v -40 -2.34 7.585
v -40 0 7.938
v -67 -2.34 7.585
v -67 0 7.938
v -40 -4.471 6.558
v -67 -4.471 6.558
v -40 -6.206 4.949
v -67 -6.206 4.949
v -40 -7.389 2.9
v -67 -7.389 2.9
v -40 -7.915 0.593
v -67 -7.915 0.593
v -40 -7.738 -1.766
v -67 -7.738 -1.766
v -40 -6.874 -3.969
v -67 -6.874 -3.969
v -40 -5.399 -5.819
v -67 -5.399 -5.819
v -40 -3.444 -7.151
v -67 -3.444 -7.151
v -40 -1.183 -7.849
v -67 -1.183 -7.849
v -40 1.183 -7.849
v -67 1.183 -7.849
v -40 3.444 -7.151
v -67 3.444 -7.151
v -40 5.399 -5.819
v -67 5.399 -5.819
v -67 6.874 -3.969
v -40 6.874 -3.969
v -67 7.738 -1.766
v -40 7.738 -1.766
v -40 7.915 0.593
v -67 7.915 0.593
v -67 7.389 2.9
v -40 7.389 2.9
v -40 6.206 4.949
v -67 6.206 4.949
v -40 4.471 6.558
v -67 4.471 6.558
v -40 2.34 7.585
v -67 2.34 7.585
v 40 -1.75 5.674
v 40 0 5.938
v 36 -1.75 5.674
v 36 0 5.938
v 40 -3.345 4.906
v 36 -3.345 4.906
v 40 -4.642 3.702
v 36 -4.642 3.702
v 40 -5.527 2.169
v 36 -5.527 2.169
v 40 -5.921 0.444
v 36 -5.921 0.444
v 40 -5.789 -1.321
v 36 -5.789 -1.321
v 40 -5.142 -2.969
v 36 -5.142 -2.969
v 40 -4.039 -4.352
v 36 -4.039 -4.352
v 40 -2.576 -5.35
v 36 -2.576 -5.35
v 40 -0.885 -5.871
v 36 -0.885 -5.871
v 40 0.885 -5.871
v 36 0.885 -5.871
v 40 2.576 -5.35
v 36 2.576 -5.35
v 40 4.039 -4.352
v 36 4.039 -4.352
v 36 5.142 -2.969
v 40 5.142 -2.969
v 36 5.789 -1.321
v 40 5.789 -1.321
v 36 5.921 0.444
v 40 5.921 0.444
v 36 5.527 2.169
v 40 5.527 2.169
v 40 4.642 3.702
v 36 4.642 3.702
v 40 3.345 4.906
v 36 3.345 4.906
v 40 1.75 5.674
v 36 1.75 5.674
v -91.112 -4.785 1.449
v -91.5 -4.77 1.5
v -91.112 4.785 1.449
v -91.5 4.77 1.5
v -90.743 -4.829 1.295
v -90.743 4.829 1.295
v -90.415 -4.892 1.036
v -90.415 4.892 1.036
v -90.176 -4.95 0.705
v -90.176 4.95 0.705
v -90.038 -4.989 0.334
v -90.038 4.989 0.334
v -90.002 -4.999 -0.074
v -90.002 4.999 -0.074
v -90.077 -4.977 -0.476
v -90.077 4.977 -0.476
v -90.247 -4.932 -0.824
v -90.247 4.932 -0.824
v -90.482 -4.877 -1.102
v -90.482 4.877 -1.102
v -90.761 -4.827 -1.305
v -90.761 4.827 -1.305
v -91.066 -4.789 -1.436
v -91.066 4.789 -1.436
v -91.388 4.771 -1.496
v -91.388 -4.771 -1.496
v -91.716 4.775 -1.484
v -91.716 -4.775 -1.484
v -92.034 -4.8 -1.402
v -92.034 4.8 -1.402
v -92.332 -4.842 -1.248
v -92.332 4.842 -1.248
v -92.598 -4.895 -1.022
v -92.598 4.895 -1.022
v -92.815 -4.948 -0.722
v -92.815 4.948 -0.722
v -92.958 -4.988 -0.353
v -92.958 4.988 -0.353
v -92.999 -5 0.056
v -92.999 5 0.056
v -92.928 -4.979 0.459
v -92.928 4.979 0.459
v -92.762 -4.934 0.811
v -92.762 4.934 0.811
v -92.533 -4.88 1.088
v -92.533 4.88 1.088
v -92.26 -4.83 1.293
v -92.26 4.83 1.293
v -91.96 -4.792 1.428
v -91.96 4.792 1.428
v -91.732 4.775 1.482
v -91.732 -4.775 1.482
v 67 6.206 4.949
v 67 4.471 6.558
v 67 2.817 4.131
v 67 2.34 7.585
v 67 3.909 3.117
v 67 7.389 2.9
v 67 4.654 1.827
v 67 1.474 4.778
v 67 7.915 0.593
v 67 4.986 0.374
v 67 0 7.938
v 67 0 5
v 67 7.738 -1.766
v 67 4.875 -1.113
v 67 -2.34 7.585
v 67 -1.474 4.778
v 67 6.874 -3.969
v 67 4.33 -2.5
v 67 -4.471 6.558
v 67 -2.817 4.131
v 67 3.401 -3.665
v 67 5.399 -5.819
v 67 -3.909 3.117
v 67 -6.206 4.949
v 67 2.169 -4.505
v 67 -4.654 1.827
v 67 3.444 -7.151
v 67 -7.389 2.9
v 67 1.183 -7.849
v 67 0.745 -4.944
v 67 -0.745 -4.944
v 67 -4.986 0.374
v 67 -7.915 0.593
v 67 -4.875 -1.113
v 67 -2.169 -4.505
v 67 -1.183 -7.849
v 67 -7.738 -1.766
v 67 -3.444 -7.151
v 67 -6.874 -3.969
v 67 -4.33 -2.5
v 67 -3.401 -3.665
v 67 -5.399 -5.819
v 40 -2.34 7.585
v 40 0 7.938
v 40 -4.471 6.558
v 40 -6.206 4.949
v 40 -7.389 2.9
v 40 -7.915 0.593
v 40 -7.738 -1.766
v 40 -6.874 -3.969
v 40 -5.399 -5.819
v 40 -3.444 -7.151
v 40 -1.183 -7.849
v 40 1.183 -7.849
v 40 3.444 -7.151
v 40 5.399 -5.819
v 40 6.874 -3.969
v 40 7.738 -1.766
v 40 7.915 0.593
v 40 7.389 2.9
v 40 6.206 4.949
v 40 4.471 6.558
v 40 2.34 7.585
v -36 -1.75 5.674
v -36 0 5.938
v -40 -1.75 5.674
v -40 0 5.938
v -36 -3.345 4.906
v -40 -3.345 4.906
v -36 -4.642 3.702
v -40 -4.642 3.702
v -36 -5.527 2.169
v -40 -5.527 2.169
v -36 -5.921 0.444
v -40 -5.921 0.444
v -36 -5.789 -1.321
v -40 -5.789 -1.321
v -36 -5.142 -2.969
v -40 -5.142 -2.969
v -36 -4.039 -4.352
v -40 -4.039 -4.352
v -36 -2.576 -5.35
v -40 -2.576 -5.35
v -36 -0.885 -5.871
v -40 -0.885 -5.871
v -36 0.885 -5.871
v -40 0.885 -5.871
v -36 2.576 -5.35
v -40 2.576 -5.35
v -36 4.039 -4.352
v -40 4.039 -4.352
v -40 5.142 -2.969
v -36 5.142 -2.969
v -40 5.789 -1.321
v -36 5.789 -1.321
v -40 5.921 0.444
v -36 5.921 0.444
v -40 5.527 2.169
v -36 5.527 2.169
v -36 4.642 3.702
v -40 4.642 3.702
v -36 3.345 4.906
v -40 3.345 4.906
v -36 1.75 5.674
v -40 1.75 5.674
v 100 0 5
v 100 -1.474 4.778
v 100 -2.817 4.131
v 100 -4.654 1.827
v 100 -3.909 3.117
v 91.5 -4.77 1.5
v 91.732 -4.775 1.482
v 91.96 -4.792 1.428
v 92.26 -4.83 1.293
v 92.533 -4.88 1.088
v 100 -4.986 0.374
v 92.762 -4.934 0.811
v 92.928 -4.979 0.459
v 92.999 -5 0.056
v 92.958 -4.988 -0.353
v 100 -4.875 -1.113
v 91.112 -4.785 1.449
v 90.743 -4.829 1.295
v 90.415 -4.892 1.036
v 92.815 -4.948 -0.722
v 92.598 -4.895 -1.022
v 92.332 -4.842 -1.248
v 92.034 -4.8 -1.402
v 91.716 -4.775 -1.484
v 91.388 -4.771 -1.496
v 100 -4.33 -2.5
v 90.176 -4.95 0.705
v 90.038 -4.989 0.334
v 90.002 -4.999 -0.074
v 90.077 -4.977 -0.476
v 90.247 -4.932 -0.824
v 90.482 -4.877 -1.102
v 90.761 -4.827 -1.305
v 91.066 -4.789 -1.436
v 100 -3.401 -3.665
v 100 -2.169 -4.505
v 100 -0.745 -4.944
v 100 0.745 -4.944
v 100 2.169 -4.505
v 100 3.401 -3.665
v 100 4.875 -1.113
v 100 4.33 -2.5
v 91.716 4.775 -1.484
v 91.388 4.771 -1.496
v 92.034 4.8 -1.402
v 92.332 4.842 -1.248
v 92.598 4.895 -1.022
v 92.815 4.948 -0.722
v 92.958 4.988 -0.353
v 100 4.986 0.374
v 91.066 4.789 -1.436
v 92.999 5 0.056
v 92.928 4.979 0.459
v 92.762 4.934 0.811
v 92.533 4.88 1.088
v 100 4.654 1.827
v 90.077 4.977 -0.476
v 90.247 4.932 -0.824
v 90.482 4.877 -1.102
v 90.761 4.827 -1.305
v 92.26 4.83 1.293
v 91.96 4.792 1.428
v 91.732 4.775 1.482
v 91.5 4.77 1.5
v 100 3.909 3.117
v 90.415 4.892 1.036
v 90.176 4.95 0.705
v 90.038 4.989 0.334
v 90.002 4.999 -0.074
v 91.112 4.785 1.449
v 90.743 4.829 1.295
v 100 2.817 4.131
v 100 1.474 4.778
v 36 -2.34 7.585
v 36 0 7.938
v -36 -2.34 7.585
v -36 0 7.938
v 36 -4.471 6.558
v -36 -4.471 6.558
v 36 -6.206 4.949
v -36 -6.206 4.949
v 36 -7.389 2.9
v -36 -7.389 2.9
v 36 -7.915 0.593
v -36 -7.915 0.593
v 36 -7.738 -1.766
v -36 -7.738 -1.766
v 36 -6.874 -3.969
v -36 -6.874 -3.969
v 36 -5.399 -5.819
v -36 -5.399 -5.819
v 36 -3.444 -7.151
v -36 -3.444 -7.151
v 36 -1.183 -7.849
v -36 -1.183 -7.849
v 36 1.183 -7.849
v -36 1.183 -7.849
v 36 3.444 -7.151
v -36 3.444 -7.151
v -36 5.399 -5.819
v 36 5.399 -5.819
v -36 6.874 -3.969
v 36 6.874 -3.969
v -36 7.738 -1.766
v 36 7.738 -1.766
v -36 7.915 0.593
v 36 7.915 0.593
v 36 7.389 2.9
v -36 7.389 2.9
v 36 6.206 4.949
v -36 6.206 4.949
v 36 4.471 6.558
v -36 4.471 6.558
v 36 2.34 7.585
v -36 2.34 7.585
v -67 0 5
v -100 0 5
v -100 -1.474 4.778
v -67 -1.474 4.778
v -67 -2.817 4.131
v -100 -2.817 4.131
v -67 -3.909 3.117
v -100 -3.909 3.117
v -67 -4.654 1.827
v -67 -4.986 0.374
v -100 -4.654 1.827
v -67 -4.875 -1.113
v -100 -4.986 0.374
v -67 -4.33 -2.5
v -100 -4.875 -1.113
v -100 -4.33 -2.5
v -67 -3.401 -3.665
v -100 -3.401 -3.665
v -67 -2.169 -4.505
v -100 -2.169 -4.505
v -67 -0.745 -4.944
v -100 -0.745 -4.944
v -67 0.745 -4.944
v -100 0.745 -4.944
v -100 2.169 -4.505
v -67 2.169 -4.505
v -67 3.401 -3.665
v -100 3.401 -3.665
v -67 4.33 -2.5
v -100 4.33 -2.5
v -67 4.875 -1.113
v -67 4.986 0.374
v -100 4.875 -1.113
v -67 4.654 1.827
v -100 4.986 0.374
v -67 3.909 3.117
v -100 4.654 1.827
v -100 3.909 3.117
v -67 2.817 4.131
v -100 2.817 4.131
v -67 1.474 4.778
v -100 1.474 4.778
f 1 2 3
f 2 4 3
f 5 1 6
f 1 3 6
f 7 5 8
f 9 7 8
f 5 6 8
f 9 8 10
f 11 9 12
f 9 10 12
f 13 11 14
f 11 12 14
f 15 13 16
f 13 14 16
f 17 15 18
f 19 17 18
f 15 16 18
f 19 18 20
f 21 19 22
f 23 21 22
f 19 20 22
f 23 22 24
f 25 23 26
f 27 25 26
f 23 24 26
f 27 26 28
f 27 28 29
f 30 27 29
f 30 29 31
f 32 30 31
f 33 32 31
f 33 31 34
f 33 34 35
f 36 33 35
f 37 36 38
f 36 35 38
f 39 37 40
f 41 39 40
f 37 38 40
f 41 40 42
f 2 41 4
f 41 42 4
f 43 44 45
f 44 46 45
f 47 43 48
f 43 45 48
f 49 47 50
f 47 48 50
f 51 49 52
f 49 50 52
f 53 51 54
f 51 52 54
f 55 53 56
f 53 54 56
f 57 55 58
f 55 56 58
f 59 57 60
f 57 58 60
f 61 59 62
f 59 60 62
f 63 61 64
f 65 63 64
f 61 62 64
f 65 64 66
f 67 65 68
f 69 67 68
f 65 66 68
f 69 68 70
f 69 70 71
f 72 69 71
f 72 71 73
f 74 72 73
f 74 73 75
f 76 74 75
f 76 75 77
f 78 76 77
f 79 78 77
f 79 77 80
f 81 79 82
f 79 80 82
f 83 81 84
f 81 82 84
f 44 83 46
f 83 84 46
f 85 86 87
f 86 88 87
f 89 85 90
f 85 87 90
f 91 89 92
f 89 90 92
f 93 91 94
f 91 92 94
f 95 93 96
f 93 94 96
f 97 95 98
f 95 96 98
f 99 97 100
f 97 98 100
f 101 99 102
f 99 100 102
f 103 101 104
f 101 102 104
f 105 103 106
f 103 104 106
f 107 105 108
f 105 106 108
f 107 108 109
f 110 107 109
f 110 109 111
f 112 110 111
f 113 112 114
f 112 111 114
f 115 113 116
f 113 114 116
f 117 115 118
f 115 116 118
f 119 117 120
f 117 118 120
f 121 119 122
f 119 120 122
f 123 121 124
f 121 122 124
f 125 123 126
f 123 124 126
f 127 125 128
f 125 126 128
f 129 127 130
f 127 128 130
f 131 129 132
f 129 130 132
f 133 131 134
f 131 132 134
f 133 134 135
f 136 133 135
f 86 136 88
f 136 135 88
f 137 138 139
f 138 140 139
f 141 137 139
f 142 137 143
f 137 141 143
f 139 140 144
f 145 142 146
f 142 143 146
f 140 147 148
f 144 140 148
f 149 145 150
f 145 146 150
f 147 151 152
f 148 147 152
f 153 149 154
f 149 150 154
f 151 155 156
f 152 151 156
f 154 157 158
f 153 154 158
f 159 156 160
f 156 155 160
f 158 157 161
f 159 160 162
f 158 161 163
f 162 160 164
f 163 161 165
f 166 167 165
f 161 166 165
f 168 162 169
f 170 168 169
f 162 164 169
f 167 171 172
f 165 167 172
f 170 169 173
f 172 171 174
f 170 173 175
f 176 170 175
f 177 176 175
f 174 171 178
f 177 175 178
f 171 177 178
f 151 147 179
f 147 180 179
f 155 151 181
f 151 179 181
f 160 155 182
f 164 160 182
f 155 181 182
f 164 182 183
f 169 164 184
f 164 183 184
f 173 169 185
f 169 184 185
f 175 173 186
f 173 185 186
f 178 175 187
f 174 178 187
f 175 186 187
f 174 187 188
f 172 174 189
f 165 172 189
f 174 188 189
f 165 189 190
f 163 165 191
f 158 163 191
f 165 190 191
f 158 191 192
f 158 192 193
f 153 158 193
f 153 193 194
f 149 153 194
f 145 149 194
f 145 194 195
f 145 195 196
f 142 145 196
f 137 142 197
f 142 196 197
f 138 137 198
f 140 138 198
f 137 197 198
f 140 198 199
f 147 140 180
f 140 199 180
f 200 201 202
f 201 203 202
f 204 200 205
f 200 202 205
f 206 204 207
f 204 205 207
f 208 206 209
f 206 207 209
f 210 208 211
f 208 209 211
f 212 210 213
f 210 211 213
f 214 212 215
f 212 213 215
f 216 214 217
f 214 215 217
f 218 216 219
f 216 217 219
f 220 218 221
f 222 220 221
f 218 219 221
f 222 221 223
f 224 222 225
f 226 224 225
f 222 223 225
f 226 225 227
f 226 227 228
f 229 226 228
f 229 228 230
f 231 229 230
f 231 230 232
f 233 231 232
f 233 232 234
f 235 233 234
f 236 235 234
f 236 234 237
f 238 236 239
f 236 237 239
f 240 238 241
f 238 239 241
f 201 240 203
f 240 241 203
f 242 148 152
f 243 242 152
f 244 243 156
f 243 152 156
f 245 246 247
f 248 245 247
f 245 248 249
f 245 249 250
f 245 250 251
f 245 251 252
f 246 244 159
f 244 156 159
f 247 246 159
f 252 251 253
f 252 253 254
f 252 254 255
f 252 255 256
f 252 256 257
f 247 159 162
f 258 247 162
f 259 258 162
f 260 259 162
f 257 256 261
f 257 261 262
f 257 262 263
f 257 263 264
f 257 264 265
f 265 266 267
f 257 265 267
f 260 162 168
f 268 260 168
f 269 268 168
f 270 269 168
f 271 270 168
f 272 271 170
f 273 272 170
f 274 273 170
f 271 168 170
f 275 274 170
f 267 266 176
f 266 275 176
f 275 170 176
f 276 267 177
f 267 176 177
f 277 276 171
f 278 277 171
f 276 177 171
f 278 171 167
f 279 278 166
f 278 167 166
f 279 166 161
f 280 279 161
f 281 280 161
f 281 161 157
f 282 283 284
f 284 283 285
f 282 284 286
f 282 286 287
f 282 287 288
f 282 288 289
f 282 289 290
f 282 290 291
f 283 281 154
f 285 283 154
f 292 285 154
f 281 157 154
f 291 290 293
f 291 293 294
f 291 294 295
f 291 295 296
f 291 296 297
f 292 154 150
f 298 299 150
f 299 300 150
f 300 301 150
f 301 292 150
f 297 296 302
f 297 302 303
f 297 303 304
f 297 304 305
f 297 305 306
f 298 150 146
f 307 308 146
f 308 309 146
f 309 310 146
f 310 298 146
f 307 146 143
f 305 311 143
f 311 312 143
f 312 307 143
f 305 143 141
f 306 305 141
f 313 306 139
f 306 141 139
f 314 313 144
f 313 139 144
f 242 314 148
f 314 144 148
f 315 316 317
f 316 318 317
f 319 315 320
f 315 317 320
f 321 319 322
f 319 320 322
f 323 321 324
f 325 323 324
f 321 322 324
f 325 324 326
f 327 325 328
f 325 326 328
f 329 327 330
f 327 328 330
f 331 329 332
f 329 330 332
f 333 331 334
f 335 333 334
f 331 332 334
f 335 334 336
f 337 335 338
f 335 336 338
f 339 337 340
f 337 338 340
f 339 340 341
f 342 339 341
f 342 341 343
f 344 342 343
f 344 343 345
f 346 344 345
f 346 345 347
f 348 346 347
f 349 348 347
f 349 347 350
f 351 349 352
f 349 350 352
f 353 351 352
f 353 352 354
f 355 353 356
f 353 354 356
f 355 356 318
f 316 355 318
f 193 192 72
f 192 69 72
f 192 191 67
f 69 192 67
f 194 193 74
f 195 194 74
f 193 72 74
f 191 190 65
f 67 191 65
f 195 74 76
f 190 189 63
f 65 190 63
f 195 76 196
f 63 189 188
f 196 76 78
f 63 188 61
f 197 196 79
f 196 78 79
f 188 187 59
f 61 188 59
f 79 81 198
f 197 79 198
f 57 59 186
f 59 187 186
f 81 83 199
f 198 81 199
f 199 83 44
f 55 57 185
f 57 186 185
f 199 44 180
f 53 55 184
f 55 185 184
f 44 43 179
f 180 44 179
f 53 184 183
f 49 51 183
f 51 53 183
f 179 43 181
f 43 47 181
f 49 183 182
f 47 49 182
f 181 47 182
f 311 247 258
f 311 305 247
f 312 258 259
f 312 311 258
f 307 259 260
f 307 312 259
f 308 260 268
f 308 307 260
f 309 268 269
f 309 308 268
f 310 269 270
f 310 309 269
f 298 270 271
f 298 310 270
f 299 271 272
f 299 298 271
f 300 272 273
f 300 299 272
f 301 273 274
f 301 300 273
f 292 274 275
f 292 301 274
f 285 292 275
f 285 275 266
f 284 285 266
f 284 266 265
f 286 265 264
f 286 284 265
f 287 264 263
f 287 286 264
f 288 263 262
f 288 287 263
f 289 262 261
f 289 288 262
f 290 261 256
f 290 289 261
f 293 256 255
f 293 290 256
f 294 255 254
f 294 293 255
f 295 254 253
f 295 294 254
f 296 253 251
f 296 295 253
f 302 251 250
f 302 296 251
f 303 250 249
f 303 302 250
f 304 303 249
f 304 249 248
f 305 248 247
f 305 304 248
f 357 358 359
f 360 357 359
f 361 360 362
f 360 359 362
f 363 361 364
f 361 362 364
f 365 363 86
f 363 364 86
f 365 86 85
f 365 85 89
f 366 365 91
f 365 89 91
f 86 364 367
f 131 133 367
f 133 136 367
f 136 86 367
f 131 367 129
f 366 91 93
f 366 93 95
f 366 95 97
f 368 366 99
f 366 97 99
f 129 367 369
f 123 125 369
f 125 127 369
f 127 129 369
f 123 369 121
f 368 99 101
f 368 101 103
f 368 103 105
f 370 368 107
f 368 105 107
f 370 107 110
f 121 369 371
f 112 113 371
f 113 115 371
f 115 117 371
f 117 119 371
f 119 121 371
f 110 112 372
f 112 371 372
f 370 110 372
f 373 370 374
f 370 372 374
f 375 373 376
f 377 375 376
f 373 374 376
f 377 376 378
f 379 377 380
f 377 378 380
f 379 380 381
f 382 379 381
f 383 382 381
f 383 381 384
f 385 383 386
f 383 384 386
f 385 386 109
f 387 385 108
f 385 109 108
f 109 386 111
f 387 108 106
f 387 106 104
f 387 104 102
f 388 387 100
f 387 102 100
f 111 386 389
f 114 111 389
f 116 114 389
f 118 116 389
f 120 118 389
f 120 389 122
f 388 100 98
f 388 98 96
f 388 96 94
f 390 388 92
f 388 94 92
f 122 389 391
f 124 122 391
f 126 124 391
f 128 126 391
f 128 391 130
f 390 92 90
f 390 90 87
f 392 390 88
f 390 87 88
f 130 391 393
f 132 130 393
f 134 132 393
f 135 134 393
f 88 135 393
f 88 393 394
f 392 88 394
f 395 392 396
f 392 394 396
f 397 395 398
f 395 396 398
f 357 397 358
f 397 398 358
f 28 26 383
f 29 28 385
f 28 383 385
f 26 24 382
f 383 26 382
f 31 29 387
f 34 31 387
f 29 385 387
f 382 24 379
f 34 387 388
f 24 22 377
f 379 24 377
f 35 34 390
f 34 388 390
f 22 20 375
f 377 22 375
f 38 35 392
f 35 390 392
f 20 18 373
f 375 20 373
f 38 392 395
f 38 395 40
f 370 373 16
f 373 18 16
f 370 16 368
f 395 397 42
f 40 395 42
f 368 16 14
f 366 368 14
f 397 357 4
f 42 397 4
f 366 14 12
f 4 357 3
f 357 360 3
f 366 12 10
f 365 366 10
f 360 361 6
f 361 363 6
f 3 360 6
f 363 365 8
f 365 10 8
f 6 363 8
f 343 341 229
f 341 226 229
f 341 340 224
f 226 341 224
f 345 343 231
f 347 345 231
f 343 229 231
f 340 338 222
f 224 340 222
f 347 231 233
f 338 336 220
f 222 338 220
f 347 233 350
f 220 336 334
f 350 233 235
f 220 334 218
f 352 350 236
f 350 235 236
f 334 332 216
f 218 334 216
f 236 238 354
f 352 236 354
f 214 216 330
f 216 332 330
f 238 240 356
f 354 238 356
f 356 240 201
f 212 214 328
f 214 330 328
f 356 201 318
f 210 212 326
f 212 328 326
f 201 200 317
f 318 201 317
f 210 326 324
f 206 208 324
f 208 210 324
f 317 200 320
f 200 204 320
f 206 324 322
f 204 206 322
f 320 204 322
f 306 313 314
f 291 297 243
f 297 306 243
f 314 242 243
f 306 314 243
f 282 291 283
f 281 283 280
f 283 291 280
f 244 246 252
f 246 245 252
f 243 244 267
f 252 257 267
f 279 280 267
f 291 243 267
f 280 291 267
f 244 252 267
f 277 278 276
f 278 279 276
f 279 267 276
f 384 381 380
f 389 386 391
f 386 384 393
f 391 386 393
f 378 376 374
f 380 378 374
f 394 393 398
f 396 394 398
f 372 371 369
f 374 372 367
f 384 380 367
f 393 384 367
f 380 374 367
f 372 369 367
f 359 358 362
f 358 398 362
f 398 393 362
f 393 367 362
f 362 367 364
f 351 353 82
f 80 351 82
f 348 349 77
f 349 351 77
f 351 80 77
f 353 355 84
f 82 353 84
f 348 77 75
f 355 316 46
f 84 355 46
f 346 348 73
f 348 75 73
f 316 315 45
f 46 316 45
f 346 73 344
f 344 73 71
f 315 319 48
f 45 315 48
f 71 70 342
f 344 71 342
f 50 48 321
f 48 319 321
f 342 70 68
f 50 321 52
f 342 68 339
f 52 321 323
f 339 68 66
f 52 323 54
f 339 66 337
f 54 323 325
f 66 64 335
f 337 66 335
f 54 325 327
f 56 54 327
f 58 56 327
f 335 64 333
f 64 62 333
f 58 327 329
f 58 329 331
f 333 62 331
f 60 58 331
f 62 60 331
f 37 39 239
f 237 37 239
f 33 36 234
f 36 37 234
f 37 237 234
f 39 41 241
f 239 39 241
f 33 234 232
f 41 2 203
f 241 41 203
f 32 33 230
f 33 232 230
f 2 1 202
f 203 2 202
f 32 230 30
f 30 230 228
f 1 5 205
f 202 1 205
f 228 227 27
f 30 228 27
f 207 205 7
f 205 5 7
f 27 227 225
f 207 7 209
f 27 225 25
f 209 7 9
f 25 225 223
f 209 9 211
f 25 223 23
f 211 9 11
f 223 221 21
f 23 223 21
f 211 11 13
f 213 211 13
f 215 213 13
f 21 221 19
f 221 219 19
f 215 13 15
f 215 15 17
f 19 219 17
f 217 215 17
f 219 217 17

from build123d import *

# Parameters (mm, degrees)
ESBO_O3_R             = 1.5
CORTE_EXTRUS_O1_DEPTH = 101.628066723


with BuildPart() as part:
    # Esboço2 → Revolução1 (revolve)
    with BuildSketch(Plane.XY, mode=Mode.PRIVATE) as revolu_o1_sk:
        Polygon((67, 7.9375), (40, 7.9375), (40, 5.9375), (36, 5.9375), (36, 7.9375), (-36, 7.9375), (-36, 5.9375), (-40, 5.9375), (-40, 7.9375), (-67, 7.9375), (-67, 5), (-100, 5), (-100, 0), (100, 0), (100, 5), (67, 5), align=None)
    revolve(revolu_o1_sk.sketch.rotate(Axis((-100, 0, 0), (1, 0, 0)), 90), axis=Axis((-100, 0, 0), (1, 0, 0)))

    # Esboço3 → Corte-extrusão1 (cut, symmetric)
    with BuildSketch(Plane(origin=(0, 0, 0), x_dir=(1, 0, 0), z_dir=(0, 1, 0))):
        with Locations(Location((-91.5, 0, 0), (0, 0, 270))):
            Circle(ESBO_O3_R)
    corte_extrus_o1 = extrude(amount=CORTE_EXTRUS_O1_DEPTH, both=True, mode=Mode.SUBTRACT)

    # Espelhar1: Corte-extrusão1 across plane
    add(corte_extrus_o1.mirror(Plane(origin=(0, 0, 0), x_dir=(0, 0, 1), z_dir=(1, 0, 0))), mode=Mode.SUBTRACT)


solid = part.part
